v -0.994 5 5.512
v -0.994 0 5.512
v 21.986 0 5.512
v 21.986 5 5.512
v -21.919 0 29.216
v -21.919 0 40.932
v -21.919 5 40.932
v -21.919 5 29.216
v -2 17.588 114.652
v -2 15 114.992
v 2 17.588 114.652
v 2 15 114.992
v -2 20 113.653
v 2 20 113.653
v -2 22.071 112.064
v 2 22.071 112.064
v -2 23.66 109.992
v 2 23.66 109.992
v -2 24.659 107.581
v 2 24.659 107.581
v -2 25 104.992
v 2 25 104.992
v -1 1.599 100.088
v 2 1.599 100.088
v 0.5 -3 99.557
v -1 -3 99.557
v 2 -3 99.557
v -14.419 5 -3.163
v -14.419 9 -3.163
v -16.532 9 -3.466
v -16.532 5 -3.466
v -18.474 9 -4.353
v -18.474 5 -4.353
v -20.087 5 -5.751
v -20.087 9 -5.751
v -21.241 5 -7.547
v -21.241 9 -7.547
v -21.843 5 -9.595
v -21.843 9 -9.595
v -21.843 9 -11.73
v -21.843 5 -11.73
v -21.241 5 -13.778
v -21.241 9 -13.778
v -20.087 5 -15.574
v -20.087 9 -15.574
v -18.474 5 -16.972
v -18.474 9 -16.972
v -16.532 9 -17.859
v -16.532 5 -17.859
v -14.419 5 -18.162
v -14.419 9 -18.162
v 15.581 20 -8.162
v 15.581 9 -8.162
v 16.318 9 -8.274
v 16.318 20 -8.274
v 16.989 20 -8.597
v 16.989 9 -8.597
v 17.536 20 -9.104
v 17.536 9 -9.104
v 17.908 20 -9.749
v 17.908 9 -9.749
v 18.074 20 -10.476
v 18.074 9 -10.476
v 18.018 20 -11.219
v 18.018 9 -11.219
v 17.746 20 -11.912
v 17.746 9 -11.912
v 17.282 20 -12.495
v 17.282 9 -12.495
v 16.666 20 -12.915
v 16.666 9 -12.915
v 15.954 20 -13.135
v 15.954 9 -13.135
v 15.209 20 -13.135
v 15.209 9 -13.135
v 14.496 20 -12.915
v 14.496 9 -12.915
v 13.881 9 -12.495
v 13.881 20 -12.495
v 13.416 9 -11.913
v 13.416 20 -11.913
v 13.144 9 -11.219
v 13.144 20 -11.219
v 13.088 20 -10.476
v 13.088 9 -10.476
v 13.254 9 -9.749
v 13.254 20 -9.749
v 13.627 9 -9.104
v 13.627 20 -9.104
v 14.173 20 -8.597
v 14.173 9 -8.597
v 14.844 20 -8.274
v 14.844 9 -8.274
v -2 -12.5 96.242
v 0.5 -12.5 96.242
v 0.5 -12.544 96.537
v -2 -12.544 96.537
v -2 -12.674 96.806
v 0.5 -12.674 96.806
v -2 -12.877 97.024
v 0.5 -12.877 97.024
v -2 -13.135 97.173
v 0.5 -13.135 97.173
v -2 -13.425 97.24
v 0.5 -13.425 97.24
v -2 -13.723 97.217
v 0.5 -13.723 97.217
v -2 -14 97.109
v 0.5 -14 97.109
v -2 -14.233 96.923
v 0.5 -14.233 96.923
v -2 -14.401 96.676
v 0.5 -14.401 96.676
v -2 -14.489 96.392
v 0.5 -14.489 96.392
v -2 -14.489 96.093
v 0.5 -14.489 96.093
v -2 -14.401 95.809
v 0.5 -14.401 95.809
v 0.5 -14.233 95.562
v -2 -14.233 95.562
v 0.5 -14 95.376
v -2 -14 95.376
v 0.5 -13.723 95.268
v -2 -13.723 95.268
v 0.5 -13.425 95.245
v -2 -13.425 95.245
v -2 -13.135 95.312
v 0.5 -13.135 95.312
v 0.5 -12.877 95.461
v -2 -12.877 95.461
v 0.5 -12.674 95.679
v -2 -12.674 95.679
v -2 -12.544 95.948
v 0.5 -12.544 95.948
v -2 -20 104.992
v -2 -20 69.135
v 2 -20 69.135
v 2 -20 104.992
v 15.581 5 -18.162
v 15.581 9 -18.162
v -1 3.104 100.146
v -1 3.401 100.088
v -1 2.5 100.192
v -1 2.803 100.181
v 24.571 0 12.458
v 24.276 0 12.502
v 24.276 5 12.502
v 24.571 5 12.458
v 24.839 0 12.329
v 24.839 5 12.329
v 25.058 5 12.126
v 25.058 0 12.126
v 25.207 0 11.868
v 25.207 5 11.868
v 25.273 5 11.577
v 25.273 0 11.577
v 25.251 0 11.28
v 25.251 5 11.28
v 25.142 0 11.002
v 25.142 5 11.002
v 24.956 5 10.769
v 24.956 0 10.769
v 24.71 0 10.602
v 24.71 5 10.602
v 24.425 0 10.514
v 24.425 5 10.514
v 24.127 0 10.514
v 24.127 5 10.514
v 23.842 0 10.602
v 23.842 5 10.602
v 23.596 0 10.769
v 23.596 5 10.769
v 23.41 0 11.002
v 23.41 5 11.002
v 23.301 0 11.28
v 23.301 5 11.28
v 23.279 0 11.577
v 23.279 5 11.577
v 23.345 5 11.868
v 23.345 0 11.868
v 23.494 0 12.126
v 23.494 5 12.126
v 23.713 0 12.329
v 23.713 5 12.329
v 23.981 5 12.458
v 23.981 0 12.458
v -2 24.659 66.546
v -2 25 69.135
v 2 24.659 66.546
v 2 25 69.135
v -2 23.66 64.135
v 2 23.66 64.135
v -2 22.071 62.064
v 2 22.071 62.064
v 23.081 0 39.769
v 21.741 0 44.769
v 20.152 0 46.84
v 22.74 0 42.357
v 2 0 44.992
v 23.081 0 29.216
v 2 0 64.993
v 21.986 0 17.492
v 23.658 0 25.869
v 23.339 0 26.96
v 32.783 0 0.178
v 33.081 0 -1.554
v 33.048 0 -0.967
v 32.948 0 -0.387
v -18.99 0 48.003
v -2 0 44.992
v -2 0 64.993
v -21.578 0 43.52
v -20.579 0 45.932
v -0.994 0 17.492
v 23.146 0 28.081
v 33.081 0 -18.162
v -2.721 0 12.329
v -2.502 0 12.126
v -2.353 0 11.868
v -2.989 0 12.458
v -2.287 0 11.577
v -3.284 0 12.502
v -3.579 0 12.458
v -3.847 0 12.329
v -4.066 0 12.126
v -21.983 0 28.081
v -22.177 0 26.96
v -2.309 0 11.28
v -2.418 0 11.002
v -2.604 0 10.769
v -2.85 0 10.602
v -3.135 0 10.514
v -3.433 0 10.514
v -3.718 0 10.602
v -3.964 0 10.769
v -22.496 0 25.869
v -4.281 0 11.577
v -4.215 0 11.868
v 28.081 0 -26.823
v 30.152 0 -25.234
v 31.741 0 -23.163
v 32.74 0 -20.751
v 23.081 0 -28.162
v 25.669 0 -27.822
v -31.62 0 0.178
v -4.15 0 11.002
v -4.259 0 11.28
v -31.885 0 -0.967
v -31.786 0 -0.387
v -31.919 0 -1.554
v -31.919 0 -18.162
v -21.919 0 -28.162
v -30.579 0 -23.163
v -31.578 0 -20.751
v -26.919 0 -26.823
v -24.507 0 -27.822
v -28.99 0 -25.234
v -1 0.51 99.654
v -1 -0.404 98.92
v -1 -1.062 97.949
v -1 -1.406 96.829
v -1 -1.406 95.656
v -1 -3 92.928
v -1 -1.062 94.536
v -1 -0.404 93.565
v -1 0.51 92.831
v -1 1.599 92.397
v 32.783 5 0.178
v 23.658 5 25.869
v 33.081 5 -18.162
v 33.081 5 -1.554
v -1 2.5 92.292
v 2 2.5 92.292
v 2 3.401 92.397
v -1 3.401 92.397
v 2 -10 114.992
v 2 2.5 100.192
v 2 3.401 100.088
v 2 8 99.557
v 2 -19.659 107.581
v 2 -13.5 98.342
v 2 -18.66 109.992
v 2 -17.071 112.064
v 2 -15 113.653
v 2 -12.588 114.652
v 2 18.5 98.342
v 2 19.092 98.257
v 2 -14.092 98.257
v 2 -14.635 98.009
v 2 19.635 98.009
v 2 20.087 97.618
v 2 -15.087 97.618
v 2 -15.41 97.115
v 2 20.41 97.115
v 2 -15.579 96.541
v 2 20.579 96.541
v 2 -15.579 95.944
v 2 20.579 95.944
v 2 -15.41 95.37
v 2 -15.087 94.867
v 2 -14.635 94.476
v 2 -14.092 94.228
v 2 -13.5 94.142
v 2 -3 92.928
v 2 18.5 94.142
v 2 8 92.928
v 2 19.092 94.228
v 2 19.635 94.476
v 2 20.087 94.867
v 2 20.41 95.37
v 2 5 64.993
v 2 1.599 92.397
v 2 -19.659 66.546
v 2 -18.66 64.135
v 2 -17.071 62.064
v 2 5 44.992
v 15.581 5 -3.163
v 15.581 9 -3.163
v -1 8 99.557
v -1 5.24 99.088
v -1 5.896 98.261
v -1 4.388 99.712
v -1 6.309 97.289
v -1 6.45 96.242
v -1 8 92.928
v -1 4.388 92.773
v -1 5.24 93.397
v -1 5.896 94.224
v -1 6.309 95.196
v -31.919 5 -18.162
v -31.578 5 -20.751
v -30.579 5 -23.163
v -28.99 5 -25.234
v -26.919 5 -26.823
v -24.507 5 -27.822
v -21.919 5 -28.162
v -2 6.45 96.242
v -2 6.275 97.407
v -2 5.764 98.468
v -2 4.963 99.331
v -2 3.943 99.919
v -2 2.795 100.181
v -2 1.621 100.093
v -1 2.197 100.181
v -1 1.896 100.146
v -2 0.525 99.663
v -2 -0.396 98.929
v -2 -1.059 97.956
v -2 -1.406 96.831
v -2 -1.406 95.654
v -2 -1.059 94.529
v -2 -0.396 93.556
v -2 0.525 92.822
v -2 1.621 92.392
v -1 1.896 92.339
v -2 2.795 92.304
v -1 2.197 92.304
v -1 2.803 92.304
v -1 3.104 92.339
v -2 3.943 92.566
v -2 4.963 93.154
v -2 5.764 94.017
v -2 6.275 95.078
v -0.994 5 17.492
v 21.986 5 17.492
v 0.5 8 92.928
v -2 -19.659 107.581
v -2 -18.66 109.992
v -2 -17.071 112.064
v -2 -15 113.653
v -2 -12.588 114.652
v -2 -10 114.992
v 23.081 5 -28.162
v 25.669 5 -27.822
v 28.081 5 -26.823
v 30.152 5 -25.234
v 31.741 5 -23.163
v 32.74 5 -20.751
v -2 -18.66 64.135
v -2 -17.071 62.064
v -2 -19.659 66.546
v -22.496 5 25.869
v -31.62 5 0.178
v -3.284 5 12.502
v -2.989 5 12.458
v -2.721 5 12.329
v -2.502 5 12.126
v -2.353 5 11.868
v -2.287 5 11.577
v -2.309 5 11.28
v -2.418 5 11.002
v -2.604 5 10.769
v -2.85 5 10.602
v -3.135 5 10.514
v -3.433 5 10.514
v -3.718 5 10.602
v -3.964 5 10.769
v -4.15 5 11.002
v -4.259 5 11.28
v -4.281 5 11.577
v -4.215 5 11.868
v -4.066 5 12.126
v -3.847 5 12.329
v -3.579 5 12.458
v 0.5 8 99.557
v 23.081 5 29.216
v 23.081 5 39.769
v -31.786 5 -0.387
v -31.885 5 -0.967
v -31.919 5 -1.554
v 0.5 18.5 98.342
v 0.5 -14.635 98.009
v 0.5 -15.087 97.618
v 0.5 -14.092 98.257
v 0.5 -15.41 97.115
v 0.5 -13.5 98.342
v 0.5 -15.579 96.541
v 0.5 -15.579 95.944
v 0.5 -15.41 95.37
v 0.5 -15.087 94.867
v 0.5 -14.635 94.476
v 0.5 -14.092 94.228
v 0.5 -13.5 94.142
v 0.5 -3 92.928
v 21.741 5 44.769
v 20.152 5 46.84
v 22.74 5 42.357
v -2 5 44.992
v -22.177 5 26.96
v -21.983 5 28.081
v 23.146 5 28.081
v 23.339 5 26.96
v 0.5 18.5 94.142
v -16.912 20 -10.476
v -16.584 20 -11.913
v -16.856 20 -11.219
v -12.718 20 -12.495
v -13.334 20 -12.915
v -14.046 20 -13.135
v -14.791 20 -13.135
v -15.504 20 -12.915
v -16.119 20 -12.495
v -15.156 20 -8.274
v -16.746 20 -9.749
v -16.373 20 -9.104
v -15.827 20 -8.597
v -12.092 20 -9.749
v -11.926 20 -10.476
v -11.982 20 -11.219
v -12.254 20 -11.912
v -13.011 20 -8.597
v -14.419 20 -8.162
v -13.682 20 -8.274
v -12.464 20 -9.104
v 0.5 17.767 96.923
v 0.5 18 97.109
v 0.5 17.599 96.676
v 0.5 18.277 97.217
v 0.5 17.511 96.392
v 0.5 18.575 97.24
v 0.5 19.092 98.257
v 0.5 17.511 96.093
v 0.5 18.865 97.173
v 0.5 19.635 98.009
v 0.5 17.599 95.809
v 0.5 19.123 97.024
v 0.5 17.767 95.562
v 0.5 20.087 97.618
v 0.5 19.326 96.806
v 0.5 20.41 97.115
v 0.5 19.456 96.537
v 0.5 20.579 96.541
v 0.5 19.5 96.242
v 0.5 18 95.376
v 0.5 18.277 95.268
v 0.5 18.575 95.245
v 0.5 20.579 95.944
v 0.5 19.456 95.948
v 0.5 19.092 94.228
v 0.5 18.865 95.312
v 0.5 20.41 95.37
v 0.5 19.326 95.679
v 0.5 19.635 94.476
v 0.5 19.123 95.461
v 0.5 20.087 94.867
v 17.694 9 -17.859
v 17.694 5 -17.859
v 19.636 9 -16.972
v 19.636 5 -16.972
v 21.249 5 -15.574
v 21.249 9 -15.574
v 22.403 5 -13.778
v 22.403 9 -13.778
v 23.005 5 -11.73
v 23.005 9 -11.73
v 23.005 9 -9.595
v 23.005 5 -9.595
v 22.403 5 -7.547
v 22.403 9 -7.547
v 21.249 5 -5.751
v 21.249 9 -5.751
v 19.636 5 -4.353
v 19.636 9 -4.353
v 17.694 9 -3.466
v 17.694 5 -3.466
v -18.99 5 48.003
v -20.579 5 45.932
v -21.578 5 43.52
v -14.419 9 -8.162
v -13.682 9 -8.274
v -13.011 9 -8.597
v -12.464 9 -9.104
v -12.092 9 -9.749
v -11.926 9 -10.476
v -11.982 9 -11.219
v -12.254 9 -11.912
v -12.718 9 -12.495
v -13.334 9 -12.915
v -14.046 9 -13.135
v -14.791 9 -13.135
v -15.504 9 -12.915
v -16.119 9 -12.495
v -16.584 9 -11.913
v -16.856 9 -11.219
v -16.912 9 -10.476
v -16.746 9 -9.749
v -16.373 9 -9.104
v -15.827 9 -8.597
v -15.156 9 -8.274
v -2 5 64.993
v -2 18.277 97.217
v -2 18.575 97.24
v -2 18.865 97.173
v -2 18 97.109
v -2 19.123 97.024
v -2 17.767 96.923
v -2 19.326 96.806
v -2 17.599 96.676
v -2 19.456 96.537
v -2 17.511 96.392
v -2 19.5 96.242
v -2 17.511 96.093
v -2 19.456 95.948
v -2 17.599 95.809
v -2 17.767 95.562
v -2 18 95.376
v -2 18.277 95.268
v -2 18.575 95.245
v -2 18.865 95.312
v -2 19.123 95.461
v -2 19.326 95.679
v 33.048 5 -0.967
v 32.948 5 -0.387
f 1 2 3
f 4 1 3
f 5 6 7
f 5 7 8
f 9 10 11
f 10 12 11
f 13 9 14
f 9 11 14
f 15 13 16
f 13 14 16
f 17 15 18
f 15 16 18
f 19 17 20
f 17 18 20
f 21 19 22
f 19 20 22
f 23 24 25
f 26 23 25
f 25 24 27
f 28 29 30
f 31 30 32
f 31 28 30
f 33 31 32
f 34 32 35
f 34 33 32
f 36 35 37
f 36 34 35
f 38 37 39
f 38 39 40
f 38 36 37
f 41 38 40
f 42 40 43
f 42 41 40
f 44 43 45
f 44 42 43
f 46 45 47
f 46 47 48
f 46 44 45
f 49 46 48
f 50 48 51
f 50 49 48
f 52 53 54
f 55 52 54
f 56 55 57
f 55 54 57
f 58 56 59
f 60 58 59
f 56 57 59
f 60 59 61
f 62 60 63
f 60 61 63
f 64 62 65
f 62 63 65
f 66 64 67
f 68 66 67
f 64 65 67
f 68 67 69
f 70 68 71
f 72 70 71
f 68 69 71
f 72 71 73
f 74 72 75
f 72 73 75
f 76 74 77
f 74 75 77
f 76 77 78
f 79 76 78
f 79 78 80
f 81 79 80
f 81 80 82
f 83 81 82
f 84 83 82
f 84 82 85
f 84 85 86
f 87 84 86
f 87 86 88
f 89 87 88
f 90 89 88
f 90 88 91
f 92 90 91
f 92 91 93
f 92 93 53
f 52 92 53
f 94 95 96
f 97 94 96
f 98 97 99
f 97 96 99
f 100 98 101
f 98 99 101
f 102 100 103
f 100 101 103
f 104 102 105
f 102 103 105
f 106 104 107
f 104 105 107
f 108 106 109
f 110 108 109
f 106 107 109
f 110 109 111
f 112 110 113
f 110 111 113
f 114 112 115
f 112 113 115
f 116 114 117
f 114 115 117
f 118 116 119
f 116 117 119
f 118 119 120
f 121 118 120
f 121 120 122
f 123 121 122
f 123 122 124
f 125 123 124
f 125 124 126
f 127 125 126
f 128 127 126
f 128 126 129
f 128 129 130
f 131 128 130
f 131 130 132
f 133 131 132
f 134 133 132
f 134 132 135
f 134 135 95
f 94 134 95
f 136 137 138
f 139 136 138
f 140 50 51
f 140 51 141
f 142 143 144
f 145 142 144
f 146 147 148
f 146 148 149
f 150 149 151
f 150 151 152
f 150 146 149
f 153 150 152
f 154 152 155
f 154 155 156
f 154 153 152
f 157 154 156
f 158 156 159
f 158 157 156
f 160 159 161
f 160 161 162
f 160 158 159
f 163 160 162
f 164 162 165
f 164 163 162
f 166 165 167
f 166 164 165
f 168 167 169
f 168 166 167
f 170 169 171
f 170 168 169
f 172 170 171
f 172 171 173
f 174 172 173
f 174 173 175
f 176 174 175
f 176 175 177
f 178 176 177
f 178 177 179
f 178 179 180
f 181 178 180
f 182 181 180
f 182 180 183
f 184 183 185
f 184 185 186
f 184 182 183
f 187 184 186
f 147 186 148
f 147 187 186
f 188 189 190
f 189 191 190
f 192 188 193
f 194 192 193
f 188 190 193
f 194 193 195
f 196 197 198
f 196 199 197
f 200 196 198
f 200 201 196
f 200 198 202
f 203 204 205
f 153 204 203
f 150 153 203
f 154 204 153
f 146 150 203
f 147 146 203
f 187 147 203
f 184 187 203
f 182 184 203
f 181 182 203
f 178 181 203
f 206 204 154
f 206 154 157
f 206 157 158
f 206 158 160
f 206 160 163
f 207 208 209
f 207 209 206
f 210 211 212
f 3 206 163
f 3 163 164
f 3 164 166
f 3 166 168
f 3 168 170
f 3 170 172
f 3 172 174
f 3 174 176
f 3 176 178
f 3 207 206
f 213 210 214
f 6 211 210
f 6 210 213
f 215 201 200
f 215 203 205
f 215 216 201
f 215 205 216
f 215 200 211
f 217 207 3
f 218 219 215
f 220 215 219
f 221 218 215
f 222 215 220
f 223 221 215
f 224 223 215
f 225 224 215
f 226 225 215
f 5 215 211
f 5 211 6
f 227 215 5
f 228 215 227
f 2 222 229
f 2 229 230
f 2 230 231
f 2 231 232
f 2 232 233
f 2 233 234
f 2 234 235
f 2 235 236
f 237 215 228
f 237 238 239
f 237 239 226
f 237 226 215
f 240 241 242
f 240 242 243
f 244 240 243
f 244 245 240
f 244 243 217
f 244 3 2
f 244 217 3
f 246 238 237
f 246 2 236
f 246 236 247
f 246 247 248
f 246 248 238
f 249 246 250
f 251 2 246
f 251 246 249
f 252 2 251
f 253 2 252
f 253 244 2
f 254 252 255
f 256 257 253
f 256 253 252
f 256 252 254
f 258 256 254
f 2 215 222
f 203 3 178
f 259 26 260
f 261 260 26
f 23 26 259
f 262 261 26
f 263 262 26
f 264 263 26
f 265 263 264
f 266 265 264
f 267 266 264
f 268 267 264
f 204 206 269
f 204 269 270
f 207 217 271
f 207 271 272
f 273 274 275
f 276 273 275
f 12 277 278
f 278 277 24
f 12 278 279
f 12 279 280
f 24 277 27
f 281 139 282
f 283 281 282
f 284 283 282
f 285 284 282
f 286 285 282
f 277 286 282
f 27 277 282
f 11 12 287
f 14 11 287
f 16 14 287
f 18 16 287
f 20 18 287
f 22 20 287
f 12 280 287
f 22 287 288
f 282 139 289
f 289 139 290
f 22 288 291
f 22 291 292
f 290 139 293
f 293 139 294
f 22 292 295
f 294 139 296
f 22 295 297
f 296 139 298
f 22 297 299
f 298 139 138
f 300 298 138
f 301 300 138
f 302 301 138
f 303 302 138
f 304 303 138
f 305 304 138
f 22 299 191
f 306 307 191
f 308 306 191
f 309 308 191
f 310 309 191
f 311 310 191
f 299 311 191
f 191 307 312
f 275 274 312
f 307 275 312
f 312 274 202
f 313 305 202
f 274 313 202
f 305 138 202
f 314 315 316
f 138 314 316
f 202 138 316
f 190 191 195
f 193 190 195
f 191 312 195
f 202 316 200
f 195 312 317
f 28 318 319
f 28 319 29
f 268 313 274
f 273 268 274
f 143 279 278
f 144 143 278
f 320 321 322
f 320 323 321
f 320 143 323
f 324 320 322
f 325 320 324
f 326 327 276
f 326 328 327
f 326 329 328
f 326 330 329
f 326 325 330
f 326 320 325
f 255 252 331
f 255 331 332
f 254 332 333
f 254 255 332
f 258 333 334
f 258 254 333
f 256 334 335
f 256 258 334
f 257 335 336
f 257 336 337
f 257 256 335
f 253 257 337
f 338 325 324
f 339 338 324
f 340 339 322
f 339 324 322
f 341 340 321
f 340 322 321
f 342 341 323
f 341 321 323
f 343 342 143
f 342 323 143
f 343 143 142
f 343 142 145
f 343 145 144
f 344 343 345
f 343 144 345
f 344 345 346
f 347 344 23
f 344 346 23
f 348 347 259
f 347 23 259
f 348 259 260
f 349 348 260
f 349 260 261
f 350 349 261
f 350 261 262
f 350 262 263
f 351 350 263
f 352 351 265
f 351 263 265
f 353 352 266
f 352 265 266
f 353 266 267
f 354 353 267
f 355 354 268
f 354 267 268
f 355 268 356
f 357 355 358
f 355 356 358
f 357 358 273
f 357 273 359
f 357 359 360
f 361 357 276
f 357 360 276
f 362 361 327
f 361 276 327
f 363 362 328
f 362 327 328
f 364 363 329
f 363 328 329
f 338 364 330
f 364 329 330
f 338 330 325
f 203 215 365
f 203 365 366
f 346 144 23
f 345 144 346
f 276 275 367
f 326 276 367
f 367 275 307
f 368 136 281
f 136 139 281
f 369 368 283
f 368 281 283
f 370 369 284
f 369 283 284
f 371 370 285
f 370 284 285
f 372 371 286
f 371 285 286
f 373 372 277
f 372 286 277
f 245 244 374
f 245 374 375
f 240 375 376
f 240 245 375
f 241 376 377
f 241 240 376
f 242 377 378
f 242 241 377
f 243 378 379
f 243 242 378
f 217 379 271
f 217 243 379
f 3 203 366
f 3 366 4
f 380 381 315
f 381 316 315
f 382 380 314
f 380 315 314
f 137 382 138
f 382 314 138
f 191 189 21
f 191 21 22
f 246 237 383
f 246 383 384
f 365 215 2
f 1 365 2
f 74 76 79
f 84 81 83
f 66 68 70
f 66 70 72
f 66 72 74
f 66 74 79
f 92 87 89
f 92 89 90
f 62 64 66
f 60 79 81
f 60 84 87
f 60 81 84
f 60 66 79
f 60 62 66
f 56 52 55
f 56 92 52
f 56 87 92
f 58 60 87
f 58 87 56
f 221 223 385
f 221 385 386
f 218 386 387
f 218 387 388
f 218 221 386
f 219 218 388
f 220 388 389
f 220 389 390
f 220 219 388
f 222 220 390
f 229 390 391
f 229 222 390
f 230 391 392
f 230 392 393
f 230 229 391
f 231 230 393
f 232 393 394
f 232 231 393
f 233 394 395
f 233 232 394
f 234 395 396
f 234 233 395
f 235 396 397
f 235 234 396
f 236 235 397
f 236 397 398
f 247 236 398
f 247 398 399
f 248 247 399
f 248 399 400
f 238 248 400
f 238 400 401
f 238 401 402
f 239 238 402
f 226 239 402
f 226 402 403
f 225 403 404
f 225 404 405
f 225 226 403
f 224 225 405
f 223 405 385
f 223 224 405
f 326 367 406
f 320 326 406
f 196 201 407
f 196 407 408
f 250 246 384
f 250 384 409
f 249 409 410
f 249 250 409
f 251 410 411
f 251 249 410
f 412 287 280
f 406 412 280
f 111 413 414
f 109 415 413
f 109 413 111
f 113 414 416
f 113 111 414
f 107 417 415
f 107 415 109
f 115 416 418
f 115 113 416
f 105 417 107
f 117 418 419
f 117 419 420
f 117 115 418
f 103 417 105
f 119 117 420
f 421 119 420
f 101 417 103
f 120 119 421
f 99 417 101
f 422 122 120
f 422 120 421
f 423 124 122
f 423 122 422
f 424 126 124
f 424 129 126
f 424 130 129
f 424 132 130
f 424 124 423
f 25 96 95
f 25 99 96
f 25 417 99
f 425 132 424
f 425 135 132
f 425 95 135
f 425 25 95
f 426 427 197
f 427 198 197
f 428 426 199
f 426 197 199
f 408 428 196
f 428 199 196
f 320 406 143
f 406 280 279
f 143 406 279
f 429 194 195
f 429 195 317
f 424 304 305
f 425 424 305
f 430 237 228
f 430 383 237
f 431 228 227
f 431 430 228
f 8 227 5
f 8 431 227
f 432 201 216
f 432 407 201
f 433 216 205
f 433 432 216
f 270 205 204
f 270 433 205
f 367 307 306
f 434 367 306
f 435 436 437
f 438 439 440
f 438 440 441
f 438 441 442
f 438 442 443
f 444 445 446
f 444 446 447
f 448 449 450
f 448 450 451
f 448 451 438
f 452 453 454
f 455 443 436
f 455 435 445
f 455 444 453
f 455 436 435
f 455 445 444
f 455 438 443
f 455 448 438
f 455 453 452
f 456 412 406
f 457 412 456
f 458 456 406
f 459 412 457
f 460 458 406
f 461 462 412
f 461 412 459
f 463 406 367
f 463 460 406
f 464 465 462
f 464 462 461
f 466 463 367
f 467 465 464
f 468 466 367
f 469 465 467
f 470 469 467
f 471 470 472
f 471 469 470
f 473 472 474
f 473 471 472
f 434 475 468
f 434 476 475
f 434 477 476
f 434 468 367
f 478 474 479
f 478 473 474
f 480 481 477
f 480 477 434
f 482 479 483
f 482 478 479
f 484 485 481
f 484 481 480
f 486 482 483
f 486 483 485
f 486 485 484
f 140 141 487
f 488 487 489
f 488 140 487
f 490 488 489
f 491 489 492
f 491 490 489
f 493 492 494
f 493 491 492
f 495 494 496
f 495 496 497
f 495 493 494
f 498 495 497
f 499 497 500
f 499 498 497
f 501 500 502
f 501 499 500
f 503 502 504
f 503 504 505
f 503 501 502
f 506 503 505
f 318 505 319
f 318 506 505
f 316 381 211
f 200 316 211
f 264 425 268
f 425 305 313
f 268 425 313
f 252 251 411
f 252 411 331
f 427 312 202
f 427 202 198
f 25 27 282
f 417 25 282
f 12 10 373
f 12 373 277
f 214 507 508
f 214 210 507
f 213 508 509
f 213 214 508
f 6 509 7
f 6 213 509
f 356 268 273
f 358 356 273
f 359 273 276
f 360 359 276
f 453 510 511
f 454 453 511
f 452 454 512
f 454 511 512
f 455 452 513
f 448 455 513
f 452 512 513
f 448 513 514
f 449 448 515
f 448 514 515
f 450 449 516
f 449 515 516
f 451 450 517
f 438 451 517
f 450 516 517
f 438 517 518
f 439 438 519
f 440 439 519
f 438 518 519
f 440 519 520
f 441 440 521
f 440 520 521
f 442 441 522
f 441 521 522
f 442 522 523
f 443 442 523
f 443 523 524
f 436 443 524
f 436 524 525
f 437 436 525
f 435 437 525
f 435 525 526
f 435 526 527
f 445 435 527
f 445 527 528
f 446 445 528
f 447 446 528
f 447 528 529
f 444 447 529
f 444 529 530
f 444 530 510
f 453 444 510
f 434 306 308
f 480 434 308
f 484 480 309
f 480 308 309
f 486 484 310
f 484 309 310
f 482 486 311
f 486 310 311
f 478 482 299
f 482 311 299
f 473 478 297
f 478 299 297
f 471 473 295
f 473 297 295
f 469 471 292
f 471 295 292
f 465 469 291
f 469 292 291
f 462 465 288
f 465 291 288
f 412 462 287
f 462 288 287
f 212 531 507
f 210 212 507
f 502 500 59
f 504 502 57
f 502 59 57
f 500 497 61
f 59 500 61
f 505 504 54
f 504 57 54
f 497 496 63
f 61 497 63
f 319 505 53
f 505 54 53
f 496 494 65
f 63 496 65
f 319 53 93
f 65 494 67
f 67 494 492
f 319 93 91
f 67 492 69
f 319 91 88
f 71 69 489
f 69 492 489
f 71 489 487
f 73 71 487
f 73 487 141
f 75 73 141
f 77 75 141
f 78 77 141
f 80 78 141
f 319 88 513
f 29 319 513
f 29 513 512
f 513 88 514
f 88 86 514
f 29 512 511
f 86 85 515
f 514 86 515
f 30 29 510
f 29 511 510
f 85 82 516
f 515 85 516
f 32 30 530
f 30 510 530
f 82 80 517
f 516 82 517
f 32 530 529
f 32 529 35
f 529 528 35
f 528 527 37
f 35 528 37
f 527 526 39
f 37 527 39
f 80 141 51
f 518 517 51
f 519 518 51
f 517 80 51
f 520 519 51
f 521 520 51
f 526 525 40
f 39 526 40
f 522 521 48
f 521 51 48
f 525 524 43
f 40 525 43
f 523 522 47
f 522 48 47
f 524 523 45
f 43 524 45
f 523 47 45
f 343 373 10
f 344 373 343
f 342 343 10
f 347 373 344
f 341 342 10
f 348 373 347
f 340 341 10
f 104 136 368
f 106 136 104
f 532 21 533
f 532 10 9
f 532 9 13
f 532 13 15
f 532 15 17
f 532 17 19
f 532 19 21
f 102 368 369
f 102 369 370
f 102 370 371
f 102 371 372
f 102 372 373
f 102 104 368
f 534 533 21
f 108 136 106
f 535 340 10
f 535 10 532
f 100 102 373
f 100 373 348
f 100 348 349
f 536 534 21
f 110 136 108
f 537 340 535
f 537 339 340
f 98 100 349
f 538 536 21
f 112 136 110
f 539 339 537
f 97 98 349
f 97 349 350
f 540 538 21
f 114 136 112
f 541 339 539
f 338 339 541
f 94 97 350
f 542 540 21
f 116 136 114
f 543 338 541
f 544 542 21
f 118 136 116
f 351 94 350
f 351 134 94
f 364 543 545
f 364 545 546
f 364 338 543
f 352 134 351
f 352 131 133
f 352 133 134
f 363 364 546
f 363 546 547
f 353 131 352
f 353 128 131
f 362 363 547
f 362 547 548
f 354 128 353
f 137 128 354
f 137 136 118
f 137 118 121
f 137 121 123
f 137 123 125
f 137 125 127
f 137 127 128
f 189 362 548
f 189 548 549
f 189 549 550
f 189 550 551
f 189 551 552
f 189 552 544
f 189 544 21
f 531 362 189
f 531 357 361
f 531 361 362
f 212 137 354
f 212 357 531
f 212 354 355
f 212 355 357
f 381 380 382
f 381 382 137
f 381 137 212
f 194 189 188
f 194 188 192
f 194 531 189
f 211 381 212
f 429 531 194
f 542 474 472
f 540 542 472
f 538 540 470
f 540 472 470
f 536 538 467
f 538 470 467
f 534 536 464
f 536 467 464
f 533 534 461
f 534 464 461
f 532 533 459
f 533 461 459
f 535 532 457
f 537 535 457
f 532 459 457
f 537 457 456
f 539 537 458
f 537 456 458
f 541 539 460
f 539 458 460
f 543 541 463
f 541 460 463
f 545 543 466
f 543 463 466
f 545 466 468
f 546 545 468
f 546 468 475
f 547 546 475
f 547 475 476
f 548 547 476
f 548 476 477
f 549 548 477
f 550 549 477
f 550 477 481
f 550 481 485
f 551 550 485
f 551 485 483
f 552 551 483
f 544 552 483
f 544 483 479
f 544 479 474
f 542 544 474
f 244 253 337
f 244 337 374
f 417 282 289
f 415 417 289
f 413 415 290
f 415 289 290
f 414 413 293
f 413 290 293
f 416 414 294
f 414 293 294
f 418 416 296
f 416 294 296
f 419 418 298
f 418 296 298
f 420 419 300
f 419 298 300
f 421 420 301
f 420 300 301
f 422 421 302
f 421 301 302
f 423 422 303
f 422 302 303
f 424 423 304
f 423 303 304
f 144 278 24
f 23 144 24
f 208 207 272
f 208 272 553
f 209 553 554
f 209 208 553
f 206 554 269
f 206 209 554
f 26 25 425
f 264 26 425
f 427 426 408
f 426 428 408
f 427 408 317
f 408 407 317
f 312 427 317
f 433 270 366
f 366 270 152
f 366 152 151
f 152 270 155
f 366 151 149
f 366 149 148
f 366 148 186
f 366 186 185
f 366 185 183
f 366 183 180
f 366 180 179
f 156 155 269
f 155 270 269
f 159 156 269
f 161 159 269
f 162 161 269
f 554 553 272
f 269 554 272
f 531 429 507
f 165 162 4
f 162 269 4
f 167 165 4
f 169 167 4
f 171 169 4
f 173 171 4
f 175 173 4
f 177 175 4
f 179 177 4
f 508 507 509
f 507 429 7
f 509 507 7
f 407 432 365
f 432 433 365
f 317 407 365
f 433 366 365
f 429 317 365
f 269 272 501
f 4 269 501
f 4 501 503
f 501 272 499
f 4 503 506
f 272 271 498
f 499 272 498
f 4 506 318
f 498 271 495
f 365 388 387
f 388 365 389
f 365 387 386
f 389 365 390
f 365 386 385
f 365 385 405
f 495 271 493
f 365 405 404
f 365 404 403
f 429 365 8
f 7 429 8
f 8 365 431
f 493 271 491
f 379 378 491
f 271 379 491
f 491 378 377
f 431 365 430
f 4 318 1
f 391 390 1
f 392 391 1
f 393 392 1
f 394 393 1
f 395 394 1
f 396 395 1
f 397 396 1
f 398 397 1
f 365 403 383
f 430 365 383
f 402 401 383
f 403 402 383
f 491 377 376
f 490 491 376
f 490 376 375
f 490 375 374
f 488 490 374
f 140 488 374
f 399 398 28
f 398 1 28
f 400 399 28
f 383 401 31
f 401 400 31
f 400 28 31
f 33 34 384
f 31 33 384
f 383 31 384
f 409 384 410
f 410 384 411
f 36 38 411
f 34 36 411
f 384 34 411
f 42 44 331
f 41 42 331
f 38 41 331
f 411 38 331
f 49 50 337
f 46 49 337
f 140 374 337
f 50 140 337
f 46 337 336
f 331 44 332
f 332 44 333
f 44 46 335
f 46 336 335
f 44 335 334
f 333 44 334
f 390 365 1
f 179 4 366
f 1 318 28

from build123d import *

# Parameters (mm, degrees)
SKETCH1_R           = 1
SKETCH1_W           = 22.98
SKETCH1_H           = 11.98
BOSS_EXTRUDE1_DEPTH = 5
SKETCH1_3_R         = 2.5
BOSS_EXTRUDE2_DEPTH = 9
SKETCH1_4_R         = 2.5
BOSS_EXTRUDE3_DEPTH = 20
SKETCH2_W           = 4
SKETCH2_H           = 45
BOSS_EXTRUDE4_DEPTH = 50
CUT_EXTRUDE1_DEPTH  = 123.24008033
RIB8_REACH          = 124.24
SKETCH7_WALL_W      = 274.764431908
SKETCH7_WALL_H      = 4
CUT_EXTRUDE2_DEPTH  = 3
SKETCH8_3_R         = 1
CUT_EXTRUDE3_DEPTH  = 123.469440072
FILLET1_R           = 10
SKETCH8_4_R         = 1
CUT_EXTRUDE4_DEPTH  = 1.5
SKETCH9_R           = 3.95
CUT_EXTRUDE5_DEPTH  = 10


with BuildPart() as part:
    # Sketch1 → Boss-Extrude1 (new body)
    with BuildSketch(Plane(origin=(0, 0, 0), x_dir=(1, 0, 0), z_dir=(0, 1, 0))):
        with BuildLine():
            Line((-31.918854571, 1.553979184), (-31.918854571, 18.1625))
            ThreePointArc((-31.918854571, 18.1625), (-28.989922383, 25.233567812), (-21.918854571, 28.1625))
            Line((-21.918854571, 28.1625), (23.081145429, 28.1625))
            ThreePointArc((23.081145429, 28.1625), (30.152213241, 25.233567812), (33.081145429, 18.1625))
            Line((33.081145429, 18.1625), (33.081145429, 1.553979184))
            ThreePointArc((33.081145429, 1.553979184), (33.006006891, 0.67544752), (32.782773845, -0.177565195))
            Line((32.782773845, -0.177565195), (23.081145429, -27.4925))
            Line((23.081145429, -27.4925), (23.081145429, -64.9925))
            Line((23.081145429, -64.9925), (-21.918854571, -64.9925))
            Line((-21.918854571, -64.9925), (-21.918854571, -27.4925))
            Line((-21.918854571, -27.4925), (-31.620482987, -0.177565195))
            ThreePointArc((-31.620482987, -0.177565195), (-31.843716032, 0.67544752), (-31.918854571, 1.553979184))
        make_face()
        with Locations(Location((-3.283854571, -11.5025, 0), (0, 0, 270))):
            Circle(SKETCH1_R, mode=Mode.SUBTRACT)
        with Locations(Location((24.276145429, -11.5025, 0), (0, 0, 270))):
            Circle(SKETCH1_R, mode=Mode.SUBTRACT)
        with Locations((10.496145429, -11.5025)):
            Rectangle(SKETCH1_W, SKETCH1_H, mode=Mode.SUBTRACT)
        with BuildLine():
            Line((15.581145429, 18.1625), (-14.418854571, 18.1625))
            ThreePointArc((-14.418854571, 18.1625), (-21.918854571, 10.6625), (-14.418854571, 3.1625))
            Line((-14.418854571, 3.1625), (15.581145429, 3.1625))
            ThreePointArc((15.581145429, 3.1625), (23.081145429, 10.6625), (15.581145429, 18.1625))
        make_face(mode=Mode.SUBTRACT)
    extrude(amount=BOSS_EXTRUDE1_DEPTH)

    # Sketch1<3> → Boss-Extrude2 (add)
    with BuildSketch(Plane(origin=(0, 0, 0), x_dir=(1, 0, 0), z_dir=(0, 1, 0))):
        with BuildLine():
            ThreePointArc((15.581145429, 18.1625), (23.081145429, 10.6625), (15.581145429, 3.1625))
            Line((15.581145429, 3.1625), (-14.418854571, 3.1625))
            ThreePointArc((-14.418854571, 3.1625), (-21.918854571, 10.6625), (-14.418854571, 18.1625))
            Line((-14.418854571, 18.1625), (15.581145429, 18.1625))
        make_face()
        with Locations(Location((-14.418854571, 10.6625, 0), (0, 0, 270))):
            Circle(SKETCH1_3_R, mode=Mode.SUBTRACT)
        with Locations(Location((15.581145429, 10.6625, 0), (0, 0, 270))):
            Circle(SKETCH1_3_R, mode=Mode.SUBTRACT)
    extrude(amount=BOSS_EXTRUDE2_DEPTH)

    # Sketch1<4> → Boss-Extrude3 (add)
    with BuildSketch(Plane(origin=(0, 0, 0), x_dir=(1, 0, 0), z_dir=(0, 1, 0))):
        with Locations(Location((15.581145429, 10.6625, 0), (0, 0, 270))):
            Circle(SKETCH1_4_R)
        with Locations(Location((-14.418854571, 10.6625, 0), (0, 0, 270))):
            Circle(SKETCH1_4_R)
    extrude(amount=BOSS_EXTRUDE3_DEPTH)

    # Sketch2 → Boss-Extrude4 (add)
    with BuildSketch(Plane.XY.offset(64.9925)):
        with Locations((0, 2.5)):
            Rectangle(SKETCH2_W, SKETCH2_H)
    extrude(amount=BOSS_EXTRUDE4_DEPTH)

    # Sketch6 → Cut-Extrude1 (cut, through all)
    with BuildSketch(Plane(origin=(0, 5, 0), x_dir=(1, 0, 0), z_dir=(0, 1, 0))):
        Polygon((-2, -64.9925), (-21.918854571, -45.073645429), (-21.918854571, -64.9925), align=None)
        Polygon((2, -64.9925), (23.081145429, -43.911354571), (23.081145429, -64.9925), align=None)
    extrude(amount=-CUT_EXTRUDE1_DEPTH, mode=Mode.SUBTRACT)

    # Sketch7 wall → Rib8 (add, up to next)
    with BuildSketch(Plane(origin=(0, 15, 54.9925), x_dir=(0, -0.707106781187, -0.707106781187), z_dir=(0, 0.707106781187, -0.707106781187)), mode=Mode.PRIVATE) as rib8_sk1:
        Rectangle(SKETCH7_WALL_W, SKETCH7_WALL_H)
    rib8_tool1 = extrude(rib8_sk1.sketch, amount=-RIB8_REACH, mode=Mode.PRIVATE) - part.part
    rib8 = rib8_tool1.solids().sort_by_distance((0, 15, 54.9925))[0]
    add(rib8)

    # Mirror2: Rib8 across plane
    add(rib8.mirror(Plane.ZX.offset(2.5)))

    # Sketch8 → Cut-Extrude2 (cut)
    with BuildSketch(Plane(origin=(2, 0, 0), x_dir=(0, 0, -1), z_dir=(1, 0, 0))):
        Polygon((-92.9284375, 8), (-99.5565625, 8), (-100.088277159, 3.401386734), (-100.1925, 2.5), (-100.088277159, 1.598613266), (-99.5565625, -3), (-92.9284375, -3), (-92.396722841, 1.598613266), (-92.2925, 2.5), (-92.396722841, 3.401386734), align=None)
    extrude(amount=-CUT_EXTRUDE2_DEPTH, mode=Mode.SUBTRACT)

    # Sketch8<3> → Cut-Extrude3 (cut, through all)
    with BuildSketch(Plane(origin=(2, 0, 0), x_dir=(0, 0, -1), z_dir=(1, 0, 0))):
        with Locations(Location((-96.2425, 18.5, 0), (0, 0, 90))):
            Circle(SKETCH8_3_R)
        with Locations(Location((-96.2425, -13.5, 0), (0, 0, 90))):
            Circle(SKETCH8_3_R)
    extrude(amount=-CUT_EXTRUDE3_DEPTH, mode=Mode.SUBTRACT)

    # Fillet1
    fillet1_edges = [part.edges().sort_by_distance(p)[0] for p in [
        (0, 25, 64.9925),
        (0, 25, 114.9925),
        (0, -20, 64.9925),
        (0, -20, 114.9925),
        (-21.918854571, 2.5, 45.073645429),
        (23.081145429, 2.5, 43.911354571),
        (23.081145429, 2.5, 27.4925),
        (-21.918854571, 2.5, 27.4925),
    ]]
    fillet(fillet1_edges, radius=FILLET1_R)

    # Sketch8<4> → Cut-Extrude4 (cut)
    # profile 1 of 2: a face of its own
    with BuildSketch(Plane(origin=(2, 0, 0), x_dir=(0, 0, -1), z_dir=(1, 0, 0))):
        with BuildLine():
            ThreePointArc((-94.1425, 18.5), (-96.2425, 20.6), (-98.3425, 18.5))
            Line((-98.3425, 18.5), (-99.5565625, 8))
            Line((-99.5565625, 8), (-92.9284375, 8))
            Line((-92.9284375, 8), (-94.1425, 18.5))
        make_face()
        with Locations(Location((-96.2425, 18.5, 0), (0, 0, 90))):
            Circle(SKETCH8_4_R, mode=Mode.SUBTRACT)
    # profile 2 of 2: a face of its own
    with BuildSketch(Plane(origin=(2, 0, 0), x_dir=(0, 0, -1), z_dir=(1, 0, 0))):
        with BuildLine():
            Line((-92.9284375, -3), (-99.5565625, -3))
            Line((-99.5565625, -3), (-98.3425, -13.5))
            ThreePointArc((-98.3425, -13.5), (-96.2425, -15.6), (-94.1425, -13.5))
            Line((-94.1425, -13.5), (-92.9284375, -3))
        make_face()
        with Locations(Location((-96.2425, -13.5, 0), (0, 0, 90))):
            Circle(SKETCH8_4_R, mode=Mode.SUBTRACT)
    extrude(amount=-CUT_EXTRUDE4_DEPTH, mode=Mode.SUBTRACT)

    # Sketch9 → Cut-Extrude5 (cut)
    with BuildSketch(Plane(origin=(-1, 0, 0), x_dir=(0, 0, -1), z_dir=(1, 0, 0))):
        with Locations(Location((-96.2425, 2.5, 0), (0, 0, 90))):
            Circle(SKETCH9_R)
    extrude(amount=-CUT_EXTRUDE5_DEPTH, mode=Mode.SUBTRACT)


solid = part.part
